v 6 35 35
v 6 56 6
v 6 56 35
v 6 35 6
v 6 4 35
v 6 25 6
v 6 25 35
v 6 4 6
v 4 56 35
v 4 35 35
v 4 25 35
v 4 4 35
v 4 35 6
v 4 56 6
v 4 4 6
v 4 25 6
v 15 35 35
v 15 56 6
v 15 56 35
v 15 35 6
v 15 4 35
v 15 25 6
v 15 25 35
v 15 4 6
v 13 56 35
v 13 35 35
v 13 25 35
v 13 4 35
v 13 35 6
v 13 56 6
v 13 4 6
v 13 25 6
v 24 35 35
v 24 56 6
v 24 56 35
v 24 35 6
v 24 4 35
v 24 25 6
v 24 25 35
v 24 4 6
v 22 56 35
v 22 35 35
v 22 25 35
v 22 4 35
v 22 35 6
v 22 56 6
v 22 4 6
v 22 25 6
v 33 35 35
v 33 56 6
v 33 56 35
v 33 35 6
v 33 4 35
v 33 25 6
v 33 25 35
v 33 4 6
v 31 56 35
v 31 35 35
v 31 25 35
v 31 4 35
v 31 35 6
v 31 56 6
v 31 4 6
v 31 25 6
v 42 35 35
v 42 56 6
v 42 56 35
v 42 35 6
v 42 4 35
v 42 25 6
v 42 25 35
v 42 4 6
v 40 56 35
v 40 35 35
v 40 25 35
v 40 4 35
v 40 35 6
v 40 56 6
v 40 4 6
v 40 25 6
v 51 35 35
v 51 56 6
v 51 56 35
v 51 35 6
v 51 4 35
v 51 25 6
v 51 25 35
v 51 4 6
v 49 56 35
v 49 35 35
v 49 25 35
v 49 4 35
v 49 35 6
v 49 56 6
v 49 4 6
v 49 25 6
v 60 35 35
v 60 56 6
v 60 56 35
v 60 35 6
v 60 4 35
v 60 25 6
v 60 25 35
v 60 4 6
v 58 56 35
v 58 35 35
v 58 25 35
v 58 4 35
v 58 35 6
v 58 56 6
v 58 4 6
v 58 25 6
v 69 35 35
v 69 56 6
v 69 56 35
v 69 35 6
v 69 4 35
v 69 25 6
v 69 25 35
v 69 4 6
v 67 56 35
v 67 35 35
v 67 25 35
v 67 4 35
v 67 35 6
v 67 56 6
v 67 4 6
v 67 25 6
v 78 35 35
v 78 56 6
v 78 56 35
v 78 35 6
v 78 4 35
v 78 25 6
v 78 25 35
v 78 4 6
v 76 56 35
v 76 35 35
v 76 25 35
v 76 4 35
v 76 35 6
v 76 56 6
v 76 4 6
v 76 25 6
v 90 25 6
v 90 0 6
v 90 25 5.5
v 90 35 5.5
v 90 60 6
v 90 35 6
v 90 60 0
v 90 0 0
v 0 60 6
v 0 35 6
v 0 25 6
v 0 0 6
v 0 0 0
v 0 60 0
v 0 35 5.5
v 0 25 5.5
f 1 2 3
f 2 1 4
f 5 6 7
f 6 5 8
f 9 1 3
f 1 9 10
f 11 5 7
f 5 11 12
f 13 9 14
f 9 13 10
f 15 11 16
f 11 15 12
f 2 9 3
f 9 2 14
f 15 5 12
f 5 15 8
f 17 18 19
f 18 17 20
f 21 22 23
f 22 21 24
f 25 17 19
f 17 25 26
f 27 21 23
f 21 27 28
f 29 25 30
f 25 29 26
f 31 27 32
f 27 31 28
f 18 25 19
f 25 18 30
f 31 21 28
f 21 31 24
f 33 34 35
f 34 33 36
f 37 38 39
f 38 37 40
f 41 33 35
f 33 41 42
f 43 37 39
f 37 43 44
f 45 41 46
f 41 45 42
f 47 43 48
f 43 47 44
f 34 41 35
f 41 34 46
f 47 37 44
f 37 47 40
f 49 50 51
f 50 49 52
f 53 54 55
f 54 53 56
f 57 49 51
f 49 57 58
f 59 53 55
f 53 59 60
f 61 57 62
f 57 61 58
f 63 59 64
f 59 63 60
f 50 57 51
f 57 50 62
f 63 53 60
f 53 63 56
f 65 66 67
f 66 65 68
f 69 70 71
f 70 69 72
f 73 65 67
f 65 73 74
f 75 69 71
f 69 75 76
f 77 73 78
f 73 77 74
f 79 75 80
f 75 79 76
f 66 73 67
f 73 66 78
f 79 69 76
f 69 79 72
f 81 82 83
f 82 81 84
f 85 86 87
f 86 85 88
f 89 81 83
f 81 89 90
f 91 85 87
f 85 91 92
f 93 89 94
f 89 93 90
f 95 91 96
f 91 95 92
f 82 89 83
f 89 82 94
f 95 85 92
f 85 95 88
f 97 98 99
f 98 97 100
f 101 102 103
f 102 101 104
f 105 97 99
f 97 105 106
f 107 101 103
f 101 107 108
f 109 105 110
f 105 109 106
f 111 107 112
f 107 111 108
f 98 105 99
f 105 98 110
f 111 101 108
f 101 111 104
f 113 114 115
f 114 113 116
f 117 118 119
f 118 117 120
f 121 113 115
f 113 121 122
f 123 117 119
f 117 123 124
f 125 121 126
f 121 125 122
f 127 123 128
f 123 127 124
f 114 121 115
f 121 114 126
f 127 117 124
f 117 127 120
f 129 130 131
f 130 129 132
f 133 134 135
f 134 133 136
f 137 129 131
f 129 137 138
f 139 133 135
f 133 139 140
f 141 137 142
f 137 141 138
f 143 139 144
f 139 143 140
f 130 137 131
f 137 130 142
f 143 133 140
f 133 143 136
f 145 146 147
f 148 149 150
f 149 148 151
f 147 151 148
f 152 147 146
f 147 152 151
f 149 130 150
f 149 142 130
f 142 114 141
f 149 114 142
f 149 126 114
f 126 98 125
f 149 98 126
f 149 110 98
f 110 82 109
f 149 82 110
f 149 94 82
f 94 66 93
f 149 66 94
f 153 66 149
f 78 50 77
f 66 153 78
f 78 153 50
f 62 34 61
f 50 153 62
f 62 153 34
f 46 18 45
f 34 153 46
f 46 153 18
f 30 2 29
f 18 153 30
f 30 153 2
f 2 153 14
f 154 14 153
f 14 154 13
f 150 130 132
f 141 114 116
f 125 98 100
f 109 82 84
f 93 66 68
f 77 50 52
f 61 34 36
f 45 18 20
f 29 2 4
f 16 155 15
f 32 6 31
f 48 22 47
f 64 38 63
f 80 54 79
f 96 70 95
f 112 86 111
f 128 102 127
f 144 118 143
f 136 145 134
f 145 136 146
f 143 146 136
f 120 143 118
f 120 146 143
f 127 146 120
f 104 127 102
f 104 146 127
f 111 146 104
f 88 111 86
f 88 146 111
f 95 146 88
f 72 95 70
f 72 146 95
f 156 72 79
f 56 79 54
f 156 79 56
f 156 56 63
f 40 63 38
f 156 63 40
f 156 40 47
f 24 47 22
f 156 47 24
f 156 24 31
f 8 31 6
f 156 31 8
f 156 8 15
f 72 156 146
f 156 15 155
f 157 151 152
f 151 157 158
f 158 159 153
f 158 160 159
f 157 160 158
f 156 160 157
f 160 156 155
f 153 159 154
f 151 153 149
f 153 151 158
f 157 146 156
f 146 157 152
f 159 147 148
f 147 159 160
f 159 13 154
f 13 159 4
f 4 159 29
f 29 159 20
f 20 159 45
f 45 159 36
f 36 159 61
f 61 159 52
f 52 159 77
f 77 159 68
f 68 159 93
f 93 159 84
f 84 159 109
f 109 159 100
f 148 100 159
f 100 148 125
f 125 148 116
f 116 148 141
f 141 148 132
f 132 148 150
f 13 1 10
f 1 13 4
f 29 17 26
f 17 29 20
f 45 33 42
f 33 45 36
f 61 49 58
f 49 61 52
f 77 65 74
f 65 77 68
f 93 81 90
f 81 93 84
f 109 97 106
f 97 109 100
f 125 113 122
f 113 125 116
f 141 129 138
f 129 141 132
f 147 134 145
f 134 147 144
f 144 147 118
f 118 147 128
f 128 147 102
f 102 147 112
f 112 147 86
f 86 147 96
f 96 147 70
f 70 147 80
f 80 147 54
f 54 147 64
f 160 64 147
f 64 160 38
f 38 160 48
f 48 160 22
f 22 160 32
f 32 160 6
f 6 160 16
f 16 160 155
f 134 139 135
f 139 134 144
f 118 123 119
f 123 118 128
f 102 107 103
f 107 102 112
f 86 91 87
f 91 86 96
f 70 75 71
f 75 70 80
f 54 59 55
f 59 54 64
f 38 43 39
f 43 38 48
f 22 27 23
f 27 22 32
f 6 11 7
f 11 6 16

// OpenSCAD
$fn = 32;

// ----------------------------------------------------------------------
// Heatsink: slotted fin block
// ----------------------------------------------------------------------

// --- parameters (mm) ---
base_l = 90;              // base length, X
base_w = 60;              // base width, Y
base_t = 6;               // base plate thickness
fin_h = 30;               // fin height above the base
fin_t = 2;                // fin thickness
edge = 4;                 // margin from the base ends
pitch = 9;                // fin pitch
slot_w = 10;              // central slot width, Y
fit_tol = 0.02;           // tolerance for press fits, mm
free_tol = 0.2;           // tolerance for clearance fits, mm

n_fins = floor((base_l - 2 * edge - fin_t) / pitch) + 1;  // fin count
total_h = base_t + fin_h - 1;  // overall height

difference() {
union() {
  cube([base_l, base_w, base_t]);
  for (i = [0 : n_fins - 1])
    translate([edge + i * pitch, edge, base_t - 1])
      cube([fin_t, base_w - 2 * edge, fin_h]);
}
  translate([-1, base_w / 2 - slot_w / 2, base_t - 0.5])
    cube([base_l + 2, slot_w, fin_h + 2]);
}
